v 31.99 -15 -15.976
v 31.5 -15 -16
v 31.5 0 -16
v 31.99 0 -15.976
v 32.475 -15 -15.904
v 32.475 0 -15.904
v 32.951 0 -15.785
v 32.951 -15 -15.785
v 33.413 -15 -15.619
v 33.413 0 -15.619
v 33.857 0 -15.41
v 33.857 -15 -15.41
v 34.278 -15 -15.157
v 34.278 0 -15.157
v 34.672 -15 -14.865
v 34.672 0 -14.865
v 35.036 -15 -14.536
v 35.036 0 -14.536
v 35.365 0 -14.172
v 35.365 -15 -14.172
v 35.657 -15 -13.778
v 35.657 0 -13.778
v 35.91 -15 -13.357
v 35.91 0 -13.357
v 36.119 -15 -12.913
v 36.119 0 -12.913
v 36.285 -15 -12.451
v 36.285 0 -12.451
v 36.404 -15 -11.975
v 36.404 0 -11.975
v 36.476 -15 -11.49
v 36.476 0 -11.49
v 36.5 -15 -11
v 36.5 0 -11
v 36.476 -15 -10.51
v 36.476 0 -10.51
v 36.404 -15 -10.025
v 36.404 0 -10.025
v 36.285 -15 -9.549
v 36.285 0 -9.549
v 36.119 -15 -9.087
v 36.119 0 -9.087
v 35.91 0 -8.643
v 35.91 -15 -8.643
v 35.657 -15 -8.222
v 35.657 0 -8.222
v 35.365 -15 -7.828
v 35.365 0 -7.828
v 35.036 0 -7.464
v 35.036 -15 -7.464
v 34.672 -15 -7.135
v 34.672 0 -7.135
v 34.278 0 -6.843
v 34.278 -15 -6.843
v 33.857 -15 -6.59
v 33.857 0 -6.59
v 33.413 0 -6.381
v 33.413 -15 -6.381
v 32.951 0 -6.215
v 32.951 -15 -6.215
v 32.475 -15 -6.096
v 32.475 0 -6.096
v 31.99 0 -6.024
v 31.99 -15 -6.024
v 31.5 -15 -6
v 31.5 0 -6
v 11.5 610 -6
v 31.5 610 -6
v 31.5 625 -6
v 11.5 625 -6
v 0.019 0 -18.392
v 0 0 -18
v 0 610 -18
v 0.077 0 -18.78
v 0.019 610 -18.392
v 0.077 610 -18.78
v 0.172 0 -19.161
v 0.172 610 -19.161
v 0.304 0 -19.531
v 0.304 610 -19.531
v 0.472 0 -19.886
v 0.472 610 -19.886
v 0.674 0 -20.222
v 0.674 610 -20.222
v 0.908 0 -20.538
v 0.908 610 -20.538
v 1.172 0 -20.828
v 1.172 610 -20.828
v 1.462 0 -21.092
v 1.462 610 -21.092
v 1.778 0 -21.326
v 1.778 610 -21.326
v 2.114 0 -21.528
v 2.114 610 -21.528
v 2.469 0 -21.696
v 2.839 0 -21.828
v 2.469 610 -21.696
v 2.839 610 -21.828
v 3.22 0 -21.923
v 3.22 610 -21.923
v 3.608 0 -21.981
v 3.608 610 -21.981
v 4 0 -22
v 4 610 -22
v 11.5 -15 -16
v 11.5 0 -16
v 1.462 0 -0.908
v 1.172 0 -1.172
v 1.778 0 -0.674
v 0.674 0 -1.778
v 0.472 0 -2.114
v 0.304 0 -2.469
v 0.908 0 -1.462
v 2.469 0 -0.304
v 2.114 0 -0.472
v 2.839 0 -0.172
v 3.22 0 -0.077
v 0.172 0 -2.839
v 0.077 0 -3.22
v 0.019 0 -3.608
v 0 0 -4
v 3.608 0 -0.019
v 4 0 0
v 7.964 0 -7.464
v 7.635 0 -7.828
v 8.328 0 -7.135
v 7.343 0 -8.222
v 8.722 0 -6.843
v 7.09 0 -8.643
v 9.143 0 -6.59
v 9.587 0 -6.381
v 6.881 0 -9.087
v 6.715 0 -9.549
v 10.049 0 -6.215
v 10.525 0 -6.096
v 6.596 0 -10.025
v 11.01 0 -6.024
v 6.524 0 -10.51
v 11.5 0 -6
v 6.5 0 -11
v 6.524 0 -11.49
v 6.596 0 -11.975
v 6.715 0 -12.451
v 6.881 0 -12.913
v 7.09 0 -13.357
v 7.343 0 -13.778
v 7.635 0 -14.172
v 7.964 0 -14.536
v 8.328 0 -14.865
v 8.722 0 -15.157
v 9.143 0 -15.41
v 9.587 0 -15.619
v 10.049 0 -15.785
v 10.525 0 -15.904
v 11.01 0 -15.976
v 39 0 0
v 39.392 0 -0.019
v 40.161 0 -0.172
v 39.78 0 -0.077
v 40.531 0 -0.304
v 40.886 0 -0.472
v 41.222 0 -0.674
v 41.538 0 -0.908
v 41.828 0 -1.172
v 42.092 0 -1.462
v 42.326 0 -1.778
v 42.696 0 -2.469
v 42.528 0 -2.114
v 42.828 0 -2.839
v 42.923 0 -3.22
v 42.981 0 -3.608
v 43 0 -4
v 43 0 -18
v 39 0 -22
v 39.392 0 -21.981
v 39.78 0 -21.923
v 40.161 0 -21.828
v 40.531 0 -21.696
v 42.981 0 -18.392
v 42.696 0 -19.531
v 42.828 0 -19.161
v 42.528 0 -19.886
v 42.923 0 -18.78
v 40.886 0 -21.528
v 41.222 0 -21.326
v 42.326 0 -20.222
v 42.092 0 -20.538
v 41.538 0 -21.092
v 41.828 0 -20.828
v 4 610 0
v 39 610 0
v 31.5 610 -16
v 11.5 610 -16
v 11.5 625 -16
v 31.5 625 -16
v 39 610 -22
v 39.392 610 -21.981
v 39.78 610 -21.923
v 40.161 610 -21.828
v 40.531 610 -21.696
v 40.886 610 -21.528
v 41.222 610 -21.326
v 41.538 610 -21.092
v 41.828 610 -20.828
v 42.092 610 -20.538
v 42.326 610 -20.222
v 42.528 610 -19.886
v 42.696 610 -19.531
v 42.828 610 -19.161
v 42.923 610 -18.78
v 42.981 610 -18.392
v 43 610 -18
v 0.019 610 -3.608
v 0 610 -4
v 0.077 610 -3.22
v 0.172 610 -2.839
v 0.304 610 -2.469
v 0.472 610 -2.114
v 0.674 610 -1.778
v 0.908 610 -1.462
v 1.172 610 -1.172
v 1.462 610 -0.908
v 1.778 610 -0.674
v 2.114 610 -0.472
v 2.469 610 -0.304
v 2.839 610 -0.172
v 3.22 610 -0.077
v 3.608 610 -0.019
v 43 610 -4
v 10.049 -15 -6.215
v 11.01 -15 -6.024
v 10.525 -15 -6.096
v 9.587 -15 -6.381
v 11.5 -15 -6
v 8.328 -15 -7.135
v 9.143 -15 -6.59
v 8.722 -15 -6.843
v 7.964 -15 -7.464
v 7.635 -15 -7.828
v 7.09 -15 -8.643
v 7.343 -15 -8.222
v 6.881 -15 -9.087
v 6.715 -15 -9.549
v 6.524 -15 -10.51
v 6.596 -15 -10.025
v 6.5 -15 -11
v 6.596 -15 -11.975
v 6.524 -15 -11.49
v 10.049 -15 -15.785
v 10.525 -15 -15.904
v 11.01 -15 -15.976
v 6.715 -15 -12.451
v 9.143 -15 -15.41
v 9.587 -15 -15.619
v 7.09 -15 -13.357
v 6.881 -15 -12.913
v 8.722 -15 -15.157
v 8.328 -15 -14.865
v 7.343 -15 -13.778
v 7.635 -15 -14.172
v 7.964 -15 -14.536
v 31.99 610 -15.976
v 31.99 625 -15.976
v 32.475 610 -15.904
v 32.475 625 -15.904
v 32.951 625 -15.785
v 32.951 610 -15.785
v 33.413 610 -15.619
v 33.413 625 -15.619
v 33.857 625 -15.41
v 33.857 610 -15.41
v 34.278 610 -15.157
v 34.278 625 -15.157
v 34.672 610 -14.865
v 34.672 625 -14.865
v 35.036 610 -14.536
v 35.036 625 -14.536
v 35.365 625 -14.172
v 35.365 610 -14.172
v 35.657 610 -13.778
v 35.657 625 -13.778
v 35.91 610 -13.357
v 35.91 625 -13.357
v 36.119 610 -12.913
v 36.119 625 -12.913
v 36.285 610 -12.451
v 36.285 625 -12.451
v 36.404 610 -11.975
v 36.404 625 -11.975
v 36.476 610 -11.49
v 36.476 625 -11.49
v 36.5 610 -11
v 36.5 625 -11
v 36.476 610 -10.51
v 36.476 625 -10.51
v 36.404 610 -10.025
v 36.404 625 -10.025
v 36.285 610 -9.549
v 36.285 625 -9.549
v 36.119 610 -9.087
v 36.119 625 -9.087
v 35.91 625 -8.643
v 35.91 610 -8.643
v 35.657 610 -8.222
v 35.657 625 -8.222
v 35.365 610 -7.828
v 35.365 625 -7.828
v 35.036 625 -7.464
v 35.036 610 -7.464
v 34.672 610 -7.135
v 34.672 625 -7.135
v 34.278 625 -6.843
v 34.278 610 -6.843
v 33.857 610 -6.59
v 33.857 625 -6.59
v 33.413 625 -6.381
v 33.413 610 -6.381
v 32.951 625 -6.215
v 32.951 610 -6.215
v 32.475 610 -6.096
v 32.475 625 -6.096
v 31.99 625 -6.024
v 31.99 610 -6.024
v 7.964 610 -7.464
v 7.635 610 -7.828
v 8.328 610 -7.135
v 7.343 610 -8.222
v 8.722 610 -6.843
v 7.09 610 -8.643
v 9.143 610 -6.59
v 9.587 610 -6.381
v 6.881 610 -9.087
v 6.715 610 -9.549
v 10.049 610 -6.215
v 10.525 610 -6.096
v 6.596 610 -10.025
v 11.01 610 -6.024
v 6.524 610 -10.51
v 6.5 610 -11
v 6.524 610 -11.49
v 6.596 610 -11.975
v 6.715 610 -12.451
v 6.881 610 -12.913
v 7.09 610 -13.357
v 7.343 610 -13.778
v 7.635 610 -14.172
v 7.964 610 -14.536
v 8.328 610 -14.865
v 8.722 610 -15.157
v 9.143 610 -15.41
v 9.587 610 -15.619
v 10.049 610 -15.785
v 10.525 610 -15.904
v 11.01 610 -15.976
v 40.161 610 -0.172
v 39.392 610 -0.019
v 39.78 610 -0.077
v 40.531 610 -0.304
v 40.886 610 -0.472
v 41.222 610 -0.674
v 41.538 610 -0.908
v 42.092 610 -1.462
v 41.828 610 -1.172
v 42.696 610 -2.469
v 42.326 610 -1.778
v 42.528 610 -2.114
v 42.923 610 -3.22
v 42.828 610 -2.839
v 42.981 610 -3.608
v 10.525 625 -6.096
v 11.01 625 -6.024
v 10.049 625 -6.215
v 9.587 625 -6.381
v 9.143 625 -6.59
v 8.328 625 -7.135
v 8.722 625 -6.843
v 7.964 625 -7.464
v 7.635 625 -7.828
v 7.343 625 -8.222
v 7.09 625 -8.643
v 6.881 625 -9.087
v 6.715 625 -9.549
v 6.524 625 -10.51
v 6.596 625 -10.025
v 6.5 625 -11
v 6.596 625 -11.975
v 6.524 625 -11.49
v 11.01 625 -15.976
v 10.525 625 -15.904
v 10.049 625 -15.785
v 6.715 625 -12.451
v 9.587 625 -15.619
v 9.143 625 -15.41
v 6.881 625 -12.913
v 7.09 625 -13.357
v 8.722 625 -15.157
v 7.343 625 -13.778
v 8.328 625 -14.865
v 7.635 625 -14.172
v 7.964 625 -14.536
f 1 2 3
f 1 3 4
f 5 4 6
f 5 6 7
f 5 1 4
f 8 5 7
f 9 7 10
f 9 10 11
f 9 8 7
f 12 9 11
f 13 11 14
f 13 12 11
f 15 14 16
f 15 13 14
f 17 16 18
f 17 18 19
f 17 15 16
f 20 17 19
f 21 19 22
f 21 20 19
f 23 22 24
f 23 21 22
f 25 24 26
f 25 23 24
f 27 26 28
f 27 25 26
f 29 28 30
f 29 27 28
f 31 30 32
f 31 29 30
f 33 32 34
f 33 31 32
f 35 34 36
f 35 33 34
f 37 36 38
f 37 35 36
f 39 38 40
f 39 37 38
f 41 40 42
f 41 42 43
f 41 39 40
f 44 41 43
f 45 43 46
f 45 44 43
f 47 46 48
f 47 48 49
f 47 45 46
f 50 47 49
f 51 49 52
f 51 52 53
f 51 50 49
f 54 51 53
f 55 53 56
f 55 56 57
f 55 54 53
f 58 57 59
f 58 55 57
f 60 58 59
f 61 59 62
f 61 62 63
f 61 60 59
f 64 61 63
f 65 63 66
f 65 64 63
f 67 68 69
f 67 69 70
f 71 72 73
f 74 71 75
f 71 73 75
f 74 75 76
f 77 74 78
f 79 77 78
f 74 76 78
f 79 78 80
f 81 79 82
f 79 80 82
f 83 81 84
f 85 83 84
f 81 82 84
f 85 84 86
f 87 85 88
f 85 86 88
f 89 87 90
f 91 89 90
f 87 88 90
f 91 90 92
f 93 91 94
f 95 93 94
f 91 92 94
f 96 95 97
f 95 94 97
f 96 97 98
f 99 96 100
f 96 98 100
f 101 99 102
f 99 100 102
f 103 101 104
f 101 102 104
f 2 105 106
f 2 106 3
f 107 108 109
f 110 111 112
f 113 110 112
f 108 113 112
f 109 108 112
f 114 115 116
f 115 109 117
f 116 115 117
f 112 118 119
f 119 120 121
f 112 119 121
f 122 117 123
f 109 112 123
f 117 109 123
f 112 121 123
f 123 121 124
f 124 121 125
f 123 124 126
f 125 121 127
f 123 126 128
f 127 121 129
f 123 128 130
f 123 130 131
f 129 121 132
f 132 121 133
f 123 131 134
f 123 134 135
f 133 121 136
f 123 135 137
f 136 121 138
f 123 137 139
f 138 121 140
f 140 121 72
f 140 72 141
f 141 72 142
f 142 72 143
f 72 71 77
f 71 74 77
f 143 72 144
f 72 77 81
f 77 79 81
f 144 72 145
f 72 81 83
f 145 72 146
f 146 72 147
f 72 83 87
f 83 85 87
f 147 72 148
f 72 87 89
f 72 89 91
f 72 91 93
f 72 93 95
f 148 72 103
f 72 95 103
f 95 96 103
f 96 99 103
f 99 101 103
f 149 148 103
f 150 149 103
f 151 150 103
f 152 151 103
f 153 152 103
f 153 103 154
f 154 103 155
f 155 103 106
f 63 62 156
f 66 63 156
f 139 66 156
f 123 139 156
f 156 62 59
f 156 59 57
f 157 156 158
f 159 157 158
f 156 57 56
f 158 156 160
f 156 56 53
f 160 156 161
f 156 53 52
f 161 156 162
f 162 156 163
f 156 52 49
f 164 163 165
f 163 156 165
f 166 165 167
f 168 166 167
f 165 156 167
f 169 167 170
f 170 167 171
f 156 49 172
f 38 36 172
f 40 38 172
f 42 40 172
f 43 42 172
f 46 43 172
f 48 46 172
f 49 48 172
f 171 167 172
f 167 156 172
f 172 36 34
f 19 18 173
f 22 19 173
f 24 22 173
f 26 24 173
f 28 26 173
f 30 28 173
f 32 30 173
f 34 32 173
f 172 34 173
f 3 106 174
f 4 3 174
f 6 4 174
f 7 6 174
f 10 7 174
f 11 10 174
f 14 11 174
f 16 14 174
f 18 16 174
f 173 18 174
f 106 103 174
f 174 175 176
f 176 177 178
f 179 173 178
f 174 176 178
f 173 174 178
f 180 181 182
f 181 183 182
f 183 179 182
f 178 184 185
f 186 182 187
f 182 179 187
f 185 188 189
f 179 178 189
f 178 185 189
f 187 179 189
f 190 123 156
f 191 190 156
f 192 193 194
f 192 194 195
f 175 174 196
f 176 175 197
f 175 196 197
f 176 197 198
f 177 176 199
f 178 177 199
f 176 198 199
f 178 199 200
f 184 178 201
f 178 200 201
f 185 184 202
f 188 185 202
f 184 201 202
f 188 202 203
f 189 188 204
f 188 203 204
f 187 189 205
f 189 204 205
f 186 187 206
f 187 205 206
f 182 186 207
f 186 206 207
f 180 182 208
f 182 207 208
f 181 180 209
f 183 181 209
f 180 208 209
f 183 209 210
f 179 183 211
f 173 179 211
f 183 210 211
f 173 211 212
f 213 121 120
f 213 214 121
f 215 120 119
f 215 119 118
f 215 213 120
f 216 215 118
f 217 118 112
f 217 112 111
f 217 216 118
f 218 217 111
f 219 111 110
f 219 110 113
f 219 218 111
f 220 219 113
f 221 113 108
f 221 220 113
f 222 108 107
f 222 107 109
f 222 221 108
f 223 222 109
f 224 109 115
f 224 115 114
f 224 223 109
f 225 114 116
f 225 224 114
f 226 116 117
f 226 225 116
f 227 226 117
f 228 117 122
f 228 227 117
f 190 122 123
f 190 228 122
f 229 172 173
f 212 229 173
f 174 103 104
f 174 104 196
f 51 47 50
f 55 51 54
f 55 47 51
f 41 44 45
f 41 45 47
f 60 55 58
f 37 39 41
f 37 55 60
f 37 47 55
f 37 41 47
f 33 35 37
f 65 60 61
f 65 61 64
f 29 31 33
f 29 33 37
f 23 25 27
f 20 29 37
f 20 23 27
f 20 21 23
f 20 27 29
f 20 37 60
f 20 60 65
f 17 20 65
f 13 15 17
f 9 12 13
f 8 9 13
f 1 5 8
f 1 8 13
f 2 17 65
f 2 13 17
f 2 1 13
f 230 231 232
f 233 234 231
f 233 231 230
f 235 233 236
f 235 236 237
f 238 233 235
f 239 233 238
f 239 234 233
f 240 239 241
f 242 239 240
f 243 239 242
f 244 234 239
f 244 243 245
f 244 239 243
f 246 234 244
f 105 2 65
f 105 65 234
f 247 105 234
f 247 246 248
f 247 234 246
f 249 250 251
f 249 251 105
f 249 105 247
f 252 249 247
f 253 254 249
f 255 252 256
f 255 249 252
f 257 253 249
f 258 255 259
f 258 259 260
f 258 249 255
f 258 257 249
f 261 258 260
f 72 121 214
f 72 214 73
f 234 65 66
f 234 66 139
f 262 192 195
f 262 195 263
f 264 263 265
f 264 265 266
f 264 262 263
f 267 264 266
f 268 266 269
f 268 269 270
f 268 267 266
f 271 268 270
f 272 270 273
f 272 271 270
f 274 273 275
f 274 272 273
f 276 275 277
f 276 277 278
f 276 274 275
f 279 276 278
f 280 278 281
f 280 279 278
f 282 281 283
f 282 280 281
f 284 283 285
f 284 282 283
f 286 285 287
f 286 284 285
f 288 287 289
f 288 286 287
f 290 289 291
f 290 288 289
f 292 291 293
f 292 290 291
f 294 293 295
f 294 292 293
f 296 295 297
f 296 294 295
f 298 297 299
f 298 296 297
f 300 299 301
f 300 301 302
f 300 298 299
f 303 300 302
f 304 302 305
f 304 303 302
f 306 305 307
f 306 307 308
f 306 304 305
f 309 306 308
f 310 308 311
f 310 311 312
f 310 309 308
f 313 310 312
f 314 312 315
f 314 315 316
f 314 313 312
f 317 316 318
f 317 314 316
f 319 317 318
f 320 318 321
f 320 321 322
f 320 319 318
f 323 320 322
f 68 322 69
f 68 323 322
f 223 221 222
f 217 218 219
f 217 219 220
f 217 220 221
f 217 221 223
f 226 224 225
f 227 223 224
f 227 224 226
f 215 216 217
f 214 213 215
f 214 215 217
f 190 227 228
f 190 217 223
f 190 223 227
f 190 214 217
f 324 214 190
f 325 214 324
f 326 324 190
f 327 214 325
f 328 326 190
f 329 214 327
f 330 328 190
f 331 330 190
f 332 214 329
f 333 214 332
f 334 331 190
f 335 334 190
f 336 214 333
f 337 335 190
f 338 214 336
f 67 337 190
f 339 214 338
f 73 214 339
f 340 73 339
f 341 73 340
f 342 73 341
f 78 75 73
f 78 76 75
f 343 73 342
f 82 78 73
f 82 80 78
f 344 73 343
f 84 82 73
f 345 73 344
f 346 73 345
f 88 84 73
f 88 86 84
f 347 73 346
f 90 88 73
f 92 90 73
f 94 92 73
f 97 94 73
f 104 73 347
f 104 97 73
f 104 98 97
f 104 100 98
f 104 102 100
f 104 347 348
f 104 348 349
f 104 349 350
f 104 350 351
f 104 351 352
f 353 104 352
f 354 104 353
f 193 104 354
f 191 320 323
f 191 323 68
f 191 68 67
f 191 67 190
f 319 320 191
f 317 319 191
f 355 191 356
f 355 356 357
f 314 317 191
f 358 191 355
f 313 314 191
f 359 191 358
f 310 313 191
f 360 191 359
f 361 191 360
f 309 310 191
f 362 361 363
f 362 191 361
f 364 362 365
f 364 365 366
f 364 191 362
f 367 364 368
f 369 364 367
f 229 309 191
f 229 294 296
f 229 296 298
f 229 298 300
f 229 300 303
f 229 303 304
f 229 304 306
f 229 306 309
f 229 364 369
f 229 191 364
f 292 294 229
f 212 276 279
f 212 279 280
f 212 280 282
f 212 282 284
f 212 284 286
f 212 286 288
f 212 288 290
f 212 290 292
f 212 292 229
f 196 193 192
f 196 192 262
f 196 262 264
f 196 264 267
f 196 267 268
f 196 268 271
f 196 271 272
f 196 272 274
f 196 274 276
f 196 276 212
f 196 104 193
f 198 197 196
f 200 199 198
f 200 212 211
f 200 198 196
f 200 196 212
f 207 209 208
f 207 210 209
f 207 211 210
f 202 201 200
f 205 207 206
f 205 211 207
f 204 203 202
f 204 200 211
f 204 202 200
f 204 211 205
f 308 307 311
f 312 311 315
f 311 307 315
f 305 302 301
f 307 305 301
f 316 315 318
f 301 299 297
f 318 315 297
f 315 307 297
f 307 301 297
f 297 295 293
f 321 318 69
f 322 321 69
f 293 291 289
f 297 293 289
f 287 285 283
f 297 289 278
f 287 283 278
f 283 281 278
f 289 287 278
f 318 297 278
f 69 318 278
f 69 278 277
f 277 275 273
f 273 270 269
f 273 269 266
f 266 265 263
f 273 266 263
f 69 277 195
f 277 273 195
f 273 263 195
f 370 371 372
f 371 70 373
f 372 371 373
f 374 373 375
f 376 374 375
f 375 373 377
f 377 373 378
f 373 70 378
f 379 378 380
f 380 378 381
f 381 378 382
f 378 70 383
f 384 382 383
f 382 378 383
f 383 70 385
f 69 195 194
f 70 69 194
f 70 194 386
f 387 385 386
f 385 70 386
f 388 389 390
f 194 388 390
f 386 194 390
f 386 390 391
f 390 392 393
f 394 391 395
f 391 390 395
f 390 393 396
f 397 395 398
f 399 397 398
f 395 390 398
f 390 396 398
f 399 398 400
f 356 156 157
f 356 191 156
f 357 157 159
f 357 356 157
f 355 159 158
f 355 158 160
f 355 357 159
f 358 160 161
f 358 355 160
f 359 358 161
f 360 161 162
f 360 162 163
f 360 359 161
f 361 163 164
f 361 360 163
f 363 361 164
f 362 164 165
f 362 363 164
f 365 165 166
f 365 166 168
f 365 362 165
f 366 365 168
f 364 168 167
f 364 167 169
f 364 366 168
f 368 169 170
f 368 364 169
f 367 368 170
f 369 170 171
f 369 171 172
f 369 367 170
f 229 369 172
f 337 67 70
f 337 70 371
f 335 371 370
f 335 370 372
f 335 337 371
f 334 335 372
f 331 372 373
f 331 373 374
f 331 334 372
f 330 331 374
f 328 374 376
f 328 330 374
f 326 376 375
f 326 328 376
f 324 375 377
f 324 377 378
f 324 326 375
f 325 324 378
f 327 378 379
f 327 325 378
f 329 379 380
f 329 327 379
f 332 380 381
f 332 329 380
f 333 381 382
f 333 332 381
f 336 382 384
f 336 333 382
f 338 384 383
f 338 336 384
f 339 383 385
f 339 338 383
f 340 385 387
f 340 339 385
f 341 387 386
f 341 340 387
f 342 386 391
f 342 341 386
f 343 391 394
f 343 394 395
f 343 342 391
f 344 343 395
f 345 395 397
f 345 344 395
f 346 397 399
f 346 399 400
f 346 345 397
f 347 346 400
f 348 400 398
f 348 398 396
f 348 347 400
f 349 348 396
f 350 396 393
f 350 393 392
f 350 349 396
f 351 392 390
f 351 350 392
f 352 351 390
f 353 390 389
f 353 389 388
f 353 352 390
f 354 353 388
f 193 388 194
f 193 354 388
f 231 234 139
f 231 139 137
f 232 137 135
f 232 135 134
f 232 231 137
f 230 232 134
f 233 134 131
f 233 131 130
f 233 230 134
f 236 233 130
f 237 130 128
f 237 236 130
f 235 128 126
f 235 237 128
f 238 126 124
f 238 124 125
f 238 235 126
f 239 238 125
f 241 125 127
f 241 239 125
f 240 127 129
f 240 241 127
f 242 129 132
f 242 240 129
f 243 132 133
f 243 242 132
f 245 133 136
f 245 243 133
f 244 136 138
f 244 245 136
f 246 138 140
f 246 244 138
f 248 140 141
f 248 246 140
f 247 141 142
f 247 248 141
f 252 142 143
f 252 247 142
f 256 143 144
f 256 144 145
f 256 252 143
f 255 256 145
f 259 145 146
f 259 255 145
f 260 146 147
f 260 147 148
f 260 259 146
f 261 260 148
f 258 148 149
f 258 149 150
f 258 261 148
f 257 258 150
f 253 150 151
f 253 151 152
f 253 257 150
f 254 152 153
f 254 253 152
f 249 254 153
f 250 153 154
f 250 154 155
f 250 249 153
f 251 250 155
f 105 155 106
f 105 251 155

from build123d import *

# Parameters (mm, degrees)
ESQUISSE1_W        = 43
ESQUISSE1_H        = 22
BOSS_EXTRU_1_DEPTH = 610
BOSS_EXTRU_2_DEPTH = 15
BOSS_EXTRU_3_START = -625
BOSS_EXTRU_3_DEPTH = 15
CONG_1_R           = 4


with BuildPart() as part:
    # Esquisse1 → Boss.-Extru.1 (new body)
    with BuildSketch(Plane(origin=(0, 0, 0), x_dir=(1, 0, 0), z_dir=(0, 1, 0))):
        with Locations((21.5, 11)):
            Rectangle(ESQUISSE1_W, ESQUISSE1_H)
    extrude(amount=BOSS_EXTRU_1_DEPTH)

    # Esquisse2 → Boss.-Extru.2 (add)
    with BuildSketch(Plane(origin=(0, 610, 0), x_dir=(1, 0, 0), z_dir=(0, 1, 0))):
        with BuildLine():
            Line((11.5, 16), (31.5, 16))
            ThreePointArc((31.5, 16), (36.5, 11), (31.5, 6))
            Line((31.5, 6), (11.5, 6))
            ThreePointArc((11.5, 6), (6.5, 11), (11.5, 16))
        make_face()
    extrude(amount=BOSS_EXTRU_2_DEPTH)

    # Esquisse2<2> → Boss.-Extru.3 (add)
    with BuildSketch(Plane(origin=(0, 610, 0), x_dir=(1, 0, 0), z_dir=(0, 1, 0)).offset(BOSS_EXTRU_3_START)):
        with BuildLine():
            Line((11.5, 16), (31.5, 16))
            ThreePointArc((31.5, 16), (36.5, 11), (31.5, 6))
            Line((31.5, 6), (11.5, 6))
            ThreePointArc((11.5, 6), (6.5, 11), (11.5, 16))
        make_face()
    extrude(amount=BOSS_EXTRU_3_DEPTH)

    # Congé1
    cong_1_edges = [part.edges().sort_by_distance(p)[0] for p in [
        (0, 305, -22),
        (43, 305, -22),
        (43, 305, 0),
        (0, 305, 0),
    ]]
    fillet(cong_1_edges, radius=CONG_1_R)


solid = part.part
